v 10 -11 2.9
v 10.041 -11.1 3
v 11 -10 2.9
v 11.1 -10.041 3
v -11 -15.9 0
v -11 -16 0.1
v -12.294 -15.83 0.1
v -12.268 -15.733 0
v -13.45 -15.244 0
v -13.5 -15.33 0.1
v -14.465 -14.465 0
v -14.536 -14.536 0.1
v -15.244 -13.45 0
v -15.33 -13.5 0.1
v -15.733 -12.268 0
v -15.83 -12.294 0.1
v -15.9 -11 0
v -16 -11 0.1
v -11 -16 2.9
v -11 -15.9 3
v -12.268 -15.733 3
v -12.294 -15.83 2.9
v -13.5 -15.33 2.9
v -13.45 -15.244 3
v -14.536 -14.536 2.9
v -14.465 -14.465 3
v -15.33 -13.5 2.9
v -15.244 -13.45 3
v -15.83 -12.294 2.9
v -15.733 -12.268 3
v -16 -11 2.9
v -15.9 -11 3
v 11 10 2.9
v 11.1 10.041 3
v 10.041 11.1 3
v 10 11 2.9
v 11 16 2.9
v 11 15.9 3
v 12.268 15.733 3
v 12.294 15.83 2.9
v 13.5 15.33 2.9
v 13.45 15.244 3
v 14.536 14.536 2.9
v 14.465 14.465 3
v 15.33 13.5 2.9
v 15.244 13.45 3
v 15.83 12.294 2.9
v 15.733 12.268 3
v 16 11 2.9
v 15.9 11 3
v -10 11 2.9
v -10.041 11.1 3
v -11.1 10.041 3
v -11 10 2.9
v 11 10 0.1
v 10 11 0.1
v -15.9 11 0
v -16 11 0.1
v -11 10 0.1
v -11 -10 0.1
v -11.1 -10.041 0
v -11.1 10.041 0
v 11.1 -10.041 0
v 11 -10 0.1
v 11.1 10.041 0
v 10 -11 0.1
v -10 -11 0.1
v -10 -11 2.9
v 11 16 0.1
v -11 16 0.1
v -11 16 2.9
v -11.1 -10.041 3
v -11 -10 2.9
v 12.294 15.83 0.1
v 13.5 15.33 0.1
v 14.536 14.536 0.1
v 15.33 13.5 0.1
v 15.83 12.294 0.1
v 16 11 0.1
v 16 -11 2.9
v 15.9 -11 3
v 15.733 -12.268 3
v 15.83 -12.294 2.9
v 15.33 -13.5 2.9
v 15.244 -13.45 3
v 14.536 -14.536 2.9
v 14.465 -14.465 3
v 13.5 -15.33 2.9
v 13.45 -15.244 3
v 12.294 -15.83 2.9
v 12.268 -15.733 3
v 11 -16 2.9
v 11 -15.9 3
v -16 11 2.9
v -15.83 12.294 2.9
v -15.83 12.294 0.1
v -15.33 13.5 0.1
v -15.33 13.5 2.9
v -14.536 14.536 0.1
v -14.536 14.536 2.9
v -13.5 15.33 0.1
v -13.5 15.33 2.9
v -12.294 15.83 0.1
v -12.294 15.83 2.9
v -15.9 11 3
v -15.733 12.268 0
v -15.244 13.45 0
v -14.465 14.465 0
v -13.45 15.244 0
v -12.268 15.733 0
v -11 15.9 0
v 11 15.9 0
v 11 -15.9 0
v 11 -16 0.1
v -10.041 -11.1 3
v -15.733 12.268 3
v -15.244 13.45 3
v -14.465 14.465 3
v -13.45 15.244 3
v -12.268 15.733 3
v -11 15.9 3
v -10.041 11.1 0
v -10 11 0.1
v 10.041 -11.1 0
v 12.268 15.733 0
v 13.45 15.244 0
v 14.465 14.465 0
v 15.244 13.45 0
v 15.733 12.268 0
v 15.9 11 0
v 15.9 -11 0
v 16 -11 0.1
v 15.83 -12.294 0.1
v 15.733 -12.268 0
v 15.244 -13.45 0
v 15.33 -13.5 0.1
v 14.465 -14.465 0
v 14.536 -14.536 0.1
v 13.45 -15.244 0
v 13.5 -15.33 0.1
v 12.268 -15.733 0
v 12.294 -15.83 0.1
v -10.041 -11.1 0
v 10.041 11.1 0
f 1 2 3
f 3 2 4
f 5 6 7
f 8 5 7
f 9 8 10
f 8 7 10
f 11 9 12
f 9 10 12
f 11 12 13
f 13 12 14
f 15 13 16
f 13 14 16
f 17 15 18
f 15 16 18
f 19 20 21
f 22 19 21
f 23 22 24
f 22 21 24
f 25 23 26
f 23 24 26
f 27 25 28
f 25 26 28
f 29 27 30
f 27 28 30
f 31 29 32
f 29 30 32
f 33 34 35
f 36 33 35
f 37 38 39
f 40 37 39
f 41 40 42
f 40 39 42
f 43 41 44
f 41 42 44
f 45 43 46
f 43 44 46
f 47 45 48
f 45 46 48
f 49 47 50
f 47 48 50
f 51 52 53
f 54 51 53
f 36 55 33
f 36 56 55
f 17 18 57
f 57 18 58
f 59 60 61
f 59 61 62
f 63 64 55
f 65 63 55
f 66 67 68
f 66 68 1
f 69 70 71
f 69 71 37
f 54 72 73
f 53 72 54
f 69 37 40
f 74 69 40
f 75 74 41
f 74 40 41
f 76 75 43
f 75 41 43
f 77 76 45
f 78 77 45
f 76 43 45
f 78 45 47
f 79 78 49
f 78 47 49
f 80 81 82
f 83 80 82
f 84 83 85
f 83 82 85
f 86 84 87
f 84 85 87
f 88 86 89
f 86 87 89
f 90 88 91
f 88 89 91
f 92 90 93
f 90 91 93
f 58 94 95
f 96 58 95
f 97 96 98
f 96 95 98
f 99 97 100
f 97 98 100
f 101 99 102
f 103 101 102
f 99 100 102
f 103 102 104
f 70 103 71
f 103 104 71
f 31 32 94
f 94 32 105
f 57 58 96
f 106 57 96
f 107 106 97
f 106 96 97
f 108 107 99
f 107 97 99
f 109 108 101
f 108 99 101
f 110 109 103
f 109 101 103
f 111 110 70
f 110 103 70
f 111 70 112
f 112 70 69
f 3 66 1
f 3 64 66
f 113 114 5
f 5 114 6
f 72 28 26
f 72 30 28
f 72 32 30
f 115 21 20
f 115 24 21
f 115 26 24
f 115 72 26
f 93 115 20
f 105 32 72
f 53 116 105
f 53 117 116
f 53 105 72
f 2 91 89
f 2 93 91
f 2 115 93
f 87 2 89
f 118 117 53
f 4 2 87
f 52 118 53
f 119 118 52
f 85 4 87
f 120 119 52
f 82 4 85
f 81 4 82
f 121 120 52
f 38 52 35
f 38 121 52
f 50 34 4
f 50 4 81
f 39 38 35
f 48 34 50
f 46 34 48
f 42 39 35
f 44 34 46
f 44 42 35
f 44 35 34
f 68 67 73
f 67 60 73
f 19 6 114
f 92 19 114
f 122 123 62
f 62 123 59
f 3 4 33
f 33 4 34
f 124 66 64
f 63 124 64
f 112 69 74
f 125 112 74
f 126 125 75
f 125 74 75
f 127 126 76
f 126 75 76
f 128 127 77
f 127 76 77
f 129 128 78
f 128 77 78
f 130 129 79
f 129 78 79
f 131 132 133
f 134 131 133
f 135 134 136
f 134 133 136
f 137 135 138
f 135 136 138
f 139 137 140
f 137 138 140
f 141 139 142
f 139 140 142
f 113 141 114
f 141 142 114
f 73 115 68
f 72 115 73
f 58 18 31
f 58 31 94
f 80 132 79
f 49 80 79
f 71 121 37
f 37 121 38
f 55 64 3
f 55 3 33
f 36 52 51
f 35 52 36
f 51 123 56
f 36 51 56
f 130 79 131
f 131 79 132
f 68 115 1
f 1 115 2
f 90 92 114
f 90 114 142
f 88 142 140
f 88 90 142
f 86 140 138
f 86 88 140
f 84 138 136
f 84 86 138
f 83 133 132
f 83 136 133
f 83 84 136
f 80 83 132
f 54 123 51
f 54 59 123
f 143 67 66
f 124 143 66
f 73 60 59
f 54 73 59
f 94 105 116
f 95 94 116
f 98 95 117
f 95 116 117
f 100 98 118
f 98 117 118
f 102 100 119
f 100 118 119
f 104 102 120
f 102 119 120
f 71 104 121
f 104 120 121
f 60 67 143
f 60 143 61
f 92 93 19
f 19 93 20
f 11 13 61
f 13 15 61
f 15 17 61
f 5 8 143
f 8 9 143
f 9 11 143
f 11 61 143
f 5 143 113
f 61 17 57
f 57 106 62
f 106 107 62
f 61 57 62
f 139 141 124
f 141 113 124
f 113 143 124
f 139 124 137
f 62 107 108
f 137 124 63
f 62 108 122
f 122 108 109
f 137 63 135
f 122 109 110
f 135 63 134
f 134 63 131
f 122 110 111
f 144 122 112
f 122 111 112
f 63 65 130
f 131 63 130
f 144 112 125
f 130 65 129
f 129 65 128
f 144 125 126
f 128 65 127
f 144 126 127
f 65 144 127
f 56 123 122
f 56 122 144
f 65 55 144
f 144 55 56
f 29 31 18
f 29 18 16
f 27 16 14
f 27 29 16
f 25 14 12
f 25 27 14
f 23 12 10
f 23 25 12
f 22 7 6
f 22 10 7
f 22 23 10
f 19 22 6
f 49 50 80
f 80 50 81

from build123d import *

# Parameters (mm, degrees)
F0_W     = 32
F0_H     = 32
F0_W_2   = 22
F0_H_2   = 22
F1_DEPTH = 3
F2_SIZE2 = 1
F2_SIZE  = 1
F3_R     = 5
F4_SIZE  = 0.1


with BuildPart() as f1:
    # F0 (on Top) → F1 (new body)
    with BuildSketch(Plane.XY):
        Rectangle(F0_W, F0_H)
        Rectangle(F0_W_2, F0_H_2, mode=Mode.SUBTRACT)
    extrude(amount=F1_DEPTH)

    # F2
    f2_edges = [f1.edges().sort_by_distance(p)[0] for p in [
        (-11, 11, 1.5),
        (-11, -11, 1.5),
        (11, 11, 1.5),
        (11, -11, 1.5),
    ]]
    chamfer(f2_edges, length=F2_SIZE, length2=F2_SIZE2)

    # F3
    f3_edges = [f1.edges().sort_by_distance(p)[0] for p in [
        (16, 16, 1.5),
        (16, -16, 1.5),
        (-16, -16, 1.5),
        (-16, 16, 1.5),
    ]]
    fillet(f3_edges, radius=F3_R)

    # F4
    f4_edges = [f1.edges().sort_by_distance(p)[0] for p in [
        (0, 16, 3),
        (14.535534, 14.535534, 3),
        (-14.535534, 14.535534, 3),
        (16, 0, 3),
        (-16, 0, 3),
        (14.535534, -14.535534, 3),
        (-14.535534, -14.535534, 3),
        (0, -16, 3),
        (-11, 0, 3),
        (-10.5, -10.5, 3),
        (-10.5, 10.5, 3),
        (0, -11, 3),
        (0, 11, 3),
        (10.5, -10.5, 3),
        (10.5, 10.5, 3),
        (11, 0, 3),
        (0, 16, 0),
        (14.535534, 14.535534, 0),
        (-14.535534, 14.535534, 0),
        (16, 0, 0),
        (-16, 0, 0),
        (14.535534, -14.535534, 0),
        (-14.535534, -14.535534, 0),
        (0, -16, 0),
        (-11, 0, 0),
        (-10.5, -10.5, 0),
        (-10.5, 10.5, 0),
        (0, -11, 0),
        (0, 11, 0),
        (10.5, -10.5, 0),
        (10.5, 10.5, 0),
        (11, 0, 0),
    ]]
    chamfer(f4_edges, length=F4_SIZE)


solid = f1.part
